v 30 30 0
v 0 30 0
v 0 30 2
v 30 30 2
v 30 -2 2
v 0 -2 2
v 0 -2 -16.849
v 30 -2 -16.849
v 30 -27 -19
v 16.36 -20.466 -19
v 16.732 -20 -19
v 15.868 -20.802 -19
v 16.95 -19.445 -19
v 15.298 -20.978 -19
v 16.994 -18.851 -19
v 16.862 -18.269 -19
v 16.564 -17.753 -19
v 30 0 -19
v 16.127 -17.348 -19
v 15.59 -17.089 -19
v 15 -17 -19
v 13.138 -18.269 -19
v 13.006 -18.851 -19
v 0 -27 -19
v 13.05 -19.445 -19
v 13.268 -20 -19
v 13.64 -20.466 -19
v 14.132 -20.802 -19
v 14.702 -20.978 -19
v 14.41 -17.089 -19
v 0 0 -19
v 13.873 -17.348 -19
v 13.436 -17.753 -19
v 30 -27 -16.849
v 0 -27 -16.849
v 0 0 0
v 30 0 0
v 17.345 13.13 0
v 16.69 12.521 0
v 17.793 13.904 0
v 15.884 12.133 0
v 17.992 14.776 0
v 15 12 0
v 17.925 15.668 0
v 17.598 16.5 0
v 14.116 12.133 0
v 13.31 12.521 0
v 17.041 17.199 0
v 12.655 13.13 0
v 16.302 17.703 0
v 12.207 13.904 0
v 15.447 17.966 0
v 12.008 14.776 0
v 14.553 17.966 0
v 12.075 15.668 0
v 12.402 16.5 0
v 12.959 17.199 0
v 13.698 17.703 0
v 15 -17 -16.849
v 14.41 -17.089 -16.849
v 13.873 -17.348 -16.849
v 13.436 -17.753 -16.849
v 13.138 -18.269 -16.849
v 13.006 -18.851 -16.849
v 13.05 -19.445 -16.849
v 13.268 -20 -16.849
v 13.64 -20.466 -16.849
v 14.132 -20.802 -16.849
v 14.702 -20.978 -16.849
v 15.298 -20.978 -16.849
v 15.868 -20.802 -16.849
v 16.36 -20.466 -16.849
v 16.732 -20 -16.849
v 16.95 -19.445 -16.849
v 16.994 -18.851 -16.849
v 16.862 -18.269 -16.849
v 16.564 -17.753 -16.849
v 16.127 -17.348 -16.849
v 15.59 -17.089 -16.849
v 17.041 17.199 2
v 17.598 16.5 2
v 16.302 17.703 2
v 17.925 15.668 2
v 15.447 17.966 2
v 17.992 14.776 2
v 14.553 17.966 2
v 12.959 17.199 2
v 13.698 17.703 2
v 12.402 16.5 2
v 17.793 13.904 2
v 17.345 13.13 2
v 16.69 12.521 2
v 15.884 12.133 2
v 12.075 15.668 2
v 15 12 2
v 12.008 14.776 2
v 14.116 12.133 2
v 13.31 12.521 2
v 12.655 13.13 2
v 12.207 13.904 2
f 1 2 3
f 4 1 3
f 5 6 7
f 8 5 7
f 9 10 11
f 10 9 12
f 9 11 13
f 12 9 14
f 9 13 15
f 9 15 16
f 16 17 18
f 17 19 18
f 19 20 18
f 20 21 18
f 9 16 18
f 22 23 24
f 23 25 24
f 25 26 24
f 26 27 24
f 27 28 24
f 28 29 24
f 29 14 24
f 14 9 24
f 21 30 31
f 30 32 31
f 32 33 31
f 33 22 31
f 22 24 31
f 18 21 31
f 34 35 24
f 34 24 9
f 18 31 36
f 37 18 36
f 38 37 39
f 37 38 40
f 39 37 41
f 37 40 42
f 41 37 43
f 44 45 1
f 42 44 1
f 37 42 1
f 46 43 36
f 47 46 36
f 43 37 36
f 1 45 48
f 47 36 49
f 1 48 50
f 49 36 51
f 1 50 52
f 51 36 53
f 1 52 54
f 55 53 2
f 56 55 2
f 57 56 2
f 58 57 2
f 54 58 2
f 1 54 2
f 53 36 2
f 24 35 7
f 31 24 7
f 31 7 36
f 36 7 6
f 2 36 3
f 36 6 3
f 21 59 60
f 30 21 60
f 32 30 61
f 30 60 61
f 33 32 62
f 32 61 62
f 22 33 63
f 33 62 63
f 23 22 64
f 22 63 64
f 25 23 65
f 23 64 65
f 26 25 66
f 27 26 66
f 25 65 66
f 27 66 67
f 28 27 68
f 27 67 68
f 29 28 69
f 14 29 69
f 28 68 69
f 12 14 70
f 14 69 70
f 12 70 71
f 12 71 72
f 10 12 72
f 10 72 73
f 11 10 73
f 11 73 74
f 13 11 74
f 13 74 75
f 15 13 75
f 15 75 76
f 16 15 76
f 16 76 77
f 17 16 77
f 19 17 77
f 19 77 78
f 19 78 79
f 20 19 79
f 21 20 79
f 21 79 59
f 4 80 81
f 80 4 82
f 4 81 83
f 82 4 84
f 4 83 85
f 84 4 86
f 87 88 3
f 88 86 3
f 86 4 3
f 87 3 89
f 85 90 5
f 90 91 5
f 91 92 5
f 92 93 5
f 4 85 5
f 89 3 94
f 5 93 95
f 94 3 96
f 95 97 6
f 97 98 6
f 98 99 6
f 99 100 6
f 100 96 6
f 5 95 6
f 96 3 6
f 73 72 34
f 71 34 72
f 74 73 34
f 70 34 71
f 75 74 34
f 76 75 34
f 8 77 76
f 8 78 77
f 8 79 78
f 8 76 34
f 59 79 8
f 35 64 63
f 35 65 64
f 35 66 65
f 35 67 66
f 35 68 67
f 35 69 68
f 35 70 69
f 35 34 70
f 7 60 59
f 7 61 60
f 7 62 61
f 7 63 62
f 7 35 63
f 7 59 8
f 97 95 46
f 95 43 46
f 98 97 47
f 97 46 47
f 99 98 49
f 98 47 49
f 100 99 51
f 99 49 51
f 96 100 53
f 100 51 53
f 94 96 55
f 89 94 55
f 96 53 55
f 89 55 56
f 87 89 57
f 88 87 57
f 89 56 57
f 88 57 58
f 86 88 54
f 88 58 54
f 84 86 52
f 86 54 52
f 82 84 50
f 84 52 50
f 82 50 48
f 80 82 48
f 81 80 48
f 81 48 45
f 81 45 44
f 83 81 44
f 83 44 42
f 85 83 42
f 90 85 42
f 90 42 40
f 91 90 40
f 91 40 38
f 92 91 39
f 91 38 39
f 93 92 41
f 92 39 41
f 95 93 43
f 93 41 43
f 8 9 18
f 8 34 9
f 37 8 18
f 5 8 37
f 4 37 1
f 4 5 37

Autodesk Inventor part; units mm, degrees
ref_plane "YZ Plane" through (0, 0, 0) normal (1, 0, 0) x (0, 1, 0)
ref_plane "XZ Plane" through (0, 0, 0) normal (0, 1, 0) x (-1, 0, 0)
ref_plane "XY Plane" through (0, 0, 0) normal (0, 0, 1) x (1, 0, 0)
sketch "Sketch1" plane through (0, 0, 0) normal (1, 0, 0) x (0, 1, 0)
  line L0 (0, 0) -> (-2, 0)
  line L1 (-2, 0) -> (-2, -19)
  line L2 (-2, -19) -> (0, -19)
  line L3 (0, -19) -> (0, 0)
  line L4 (0, 0) -> (30, 0)
  line L5 (30, 0) -> (30, 2)
  line L6 (30, 2) -> (0, 2)
  line L7 (0, 2) -> (0, 0)
  line L8 (-2, -19) -> (-32, -19)
  line L9 (-32, -19) -> (-32, -16.849)
  line L10 (-32, -16.849) -> (-2, -16.849)
  line L11 (-2, -16.849) -> (-2, -19)
  line L12 (0, 0) -> (-2, 0)
  line L13 (-2, 0) -> (-2, 2)
  line L14 (-2, 2) -> (0, 2)
  line L15 (0, 2) -> (0, 0)
  point P0 (-2, -16.849)
  dimension "d0" = 2
  dimension "d1" = 19
  dimension "d2" = 30
  dimension "d3" = 2
  dimension "d4" = 30
extrude "Extrusion1" add sketch "Sketch1" along normal blind 30
sketch "Sketch2" plane through (0, -2, 2) normal (0, 0, 1) x (1, 0, 0)
  line L0 (0, 0) -> (30, 0) projected
  line L1 (0, 0) -> (15, 0)
  line L2 (15, 0) -> (15, 17)
  circle A0 centre (15, 17) radius 3
  point P0 (0, 2)
  dimension "d7" = 17
  dimension "d8" = 6
hole "Hole1" at (15, 15, 2) direction (0, 0, -1) diameter 6 end through all
sketch "Sketch4" plane through (0, -32, -19) normal (0, 0, -1) x (-1, 0, 0)
  line L0 (0, 32) -> (-15, 32)
  line L1 (0, 32) -> (-30, 32) projected
  line L2 (-15, 32) -> (-15, 13)
  dimension "d25" = 19
hole "Hole3" at (15, -19, -19) direction (0, 0, 1) diameter 4 end through all
sketch "Sketch5" plane through (0, -32, -19) normal (0, -1, 0) x (1, 0, 0)
  line L0 (0, 0) -> (30, 0) projected
  line L1 (0, 2.151) -> (30, 2.151) projected
  line L2 (30, 0) -> (0, 0)
  line L3 (0, 0) -> (0, 2.151)
  line L4 (0, 2.151) -> (30, 2.151)
  line L5 (30, 2.151) -> (30, 0)
  point P0 (0, 19)
extrude "Extrusion2" cut sketch "Sketch5" against normal blind 5
thread "Thread1" size "M4x0.7" class "6H" standard "ANSI Metric M Profile" length 70
properties part number "transversal-2l-stabilizer" material "Aluminum 6061"
